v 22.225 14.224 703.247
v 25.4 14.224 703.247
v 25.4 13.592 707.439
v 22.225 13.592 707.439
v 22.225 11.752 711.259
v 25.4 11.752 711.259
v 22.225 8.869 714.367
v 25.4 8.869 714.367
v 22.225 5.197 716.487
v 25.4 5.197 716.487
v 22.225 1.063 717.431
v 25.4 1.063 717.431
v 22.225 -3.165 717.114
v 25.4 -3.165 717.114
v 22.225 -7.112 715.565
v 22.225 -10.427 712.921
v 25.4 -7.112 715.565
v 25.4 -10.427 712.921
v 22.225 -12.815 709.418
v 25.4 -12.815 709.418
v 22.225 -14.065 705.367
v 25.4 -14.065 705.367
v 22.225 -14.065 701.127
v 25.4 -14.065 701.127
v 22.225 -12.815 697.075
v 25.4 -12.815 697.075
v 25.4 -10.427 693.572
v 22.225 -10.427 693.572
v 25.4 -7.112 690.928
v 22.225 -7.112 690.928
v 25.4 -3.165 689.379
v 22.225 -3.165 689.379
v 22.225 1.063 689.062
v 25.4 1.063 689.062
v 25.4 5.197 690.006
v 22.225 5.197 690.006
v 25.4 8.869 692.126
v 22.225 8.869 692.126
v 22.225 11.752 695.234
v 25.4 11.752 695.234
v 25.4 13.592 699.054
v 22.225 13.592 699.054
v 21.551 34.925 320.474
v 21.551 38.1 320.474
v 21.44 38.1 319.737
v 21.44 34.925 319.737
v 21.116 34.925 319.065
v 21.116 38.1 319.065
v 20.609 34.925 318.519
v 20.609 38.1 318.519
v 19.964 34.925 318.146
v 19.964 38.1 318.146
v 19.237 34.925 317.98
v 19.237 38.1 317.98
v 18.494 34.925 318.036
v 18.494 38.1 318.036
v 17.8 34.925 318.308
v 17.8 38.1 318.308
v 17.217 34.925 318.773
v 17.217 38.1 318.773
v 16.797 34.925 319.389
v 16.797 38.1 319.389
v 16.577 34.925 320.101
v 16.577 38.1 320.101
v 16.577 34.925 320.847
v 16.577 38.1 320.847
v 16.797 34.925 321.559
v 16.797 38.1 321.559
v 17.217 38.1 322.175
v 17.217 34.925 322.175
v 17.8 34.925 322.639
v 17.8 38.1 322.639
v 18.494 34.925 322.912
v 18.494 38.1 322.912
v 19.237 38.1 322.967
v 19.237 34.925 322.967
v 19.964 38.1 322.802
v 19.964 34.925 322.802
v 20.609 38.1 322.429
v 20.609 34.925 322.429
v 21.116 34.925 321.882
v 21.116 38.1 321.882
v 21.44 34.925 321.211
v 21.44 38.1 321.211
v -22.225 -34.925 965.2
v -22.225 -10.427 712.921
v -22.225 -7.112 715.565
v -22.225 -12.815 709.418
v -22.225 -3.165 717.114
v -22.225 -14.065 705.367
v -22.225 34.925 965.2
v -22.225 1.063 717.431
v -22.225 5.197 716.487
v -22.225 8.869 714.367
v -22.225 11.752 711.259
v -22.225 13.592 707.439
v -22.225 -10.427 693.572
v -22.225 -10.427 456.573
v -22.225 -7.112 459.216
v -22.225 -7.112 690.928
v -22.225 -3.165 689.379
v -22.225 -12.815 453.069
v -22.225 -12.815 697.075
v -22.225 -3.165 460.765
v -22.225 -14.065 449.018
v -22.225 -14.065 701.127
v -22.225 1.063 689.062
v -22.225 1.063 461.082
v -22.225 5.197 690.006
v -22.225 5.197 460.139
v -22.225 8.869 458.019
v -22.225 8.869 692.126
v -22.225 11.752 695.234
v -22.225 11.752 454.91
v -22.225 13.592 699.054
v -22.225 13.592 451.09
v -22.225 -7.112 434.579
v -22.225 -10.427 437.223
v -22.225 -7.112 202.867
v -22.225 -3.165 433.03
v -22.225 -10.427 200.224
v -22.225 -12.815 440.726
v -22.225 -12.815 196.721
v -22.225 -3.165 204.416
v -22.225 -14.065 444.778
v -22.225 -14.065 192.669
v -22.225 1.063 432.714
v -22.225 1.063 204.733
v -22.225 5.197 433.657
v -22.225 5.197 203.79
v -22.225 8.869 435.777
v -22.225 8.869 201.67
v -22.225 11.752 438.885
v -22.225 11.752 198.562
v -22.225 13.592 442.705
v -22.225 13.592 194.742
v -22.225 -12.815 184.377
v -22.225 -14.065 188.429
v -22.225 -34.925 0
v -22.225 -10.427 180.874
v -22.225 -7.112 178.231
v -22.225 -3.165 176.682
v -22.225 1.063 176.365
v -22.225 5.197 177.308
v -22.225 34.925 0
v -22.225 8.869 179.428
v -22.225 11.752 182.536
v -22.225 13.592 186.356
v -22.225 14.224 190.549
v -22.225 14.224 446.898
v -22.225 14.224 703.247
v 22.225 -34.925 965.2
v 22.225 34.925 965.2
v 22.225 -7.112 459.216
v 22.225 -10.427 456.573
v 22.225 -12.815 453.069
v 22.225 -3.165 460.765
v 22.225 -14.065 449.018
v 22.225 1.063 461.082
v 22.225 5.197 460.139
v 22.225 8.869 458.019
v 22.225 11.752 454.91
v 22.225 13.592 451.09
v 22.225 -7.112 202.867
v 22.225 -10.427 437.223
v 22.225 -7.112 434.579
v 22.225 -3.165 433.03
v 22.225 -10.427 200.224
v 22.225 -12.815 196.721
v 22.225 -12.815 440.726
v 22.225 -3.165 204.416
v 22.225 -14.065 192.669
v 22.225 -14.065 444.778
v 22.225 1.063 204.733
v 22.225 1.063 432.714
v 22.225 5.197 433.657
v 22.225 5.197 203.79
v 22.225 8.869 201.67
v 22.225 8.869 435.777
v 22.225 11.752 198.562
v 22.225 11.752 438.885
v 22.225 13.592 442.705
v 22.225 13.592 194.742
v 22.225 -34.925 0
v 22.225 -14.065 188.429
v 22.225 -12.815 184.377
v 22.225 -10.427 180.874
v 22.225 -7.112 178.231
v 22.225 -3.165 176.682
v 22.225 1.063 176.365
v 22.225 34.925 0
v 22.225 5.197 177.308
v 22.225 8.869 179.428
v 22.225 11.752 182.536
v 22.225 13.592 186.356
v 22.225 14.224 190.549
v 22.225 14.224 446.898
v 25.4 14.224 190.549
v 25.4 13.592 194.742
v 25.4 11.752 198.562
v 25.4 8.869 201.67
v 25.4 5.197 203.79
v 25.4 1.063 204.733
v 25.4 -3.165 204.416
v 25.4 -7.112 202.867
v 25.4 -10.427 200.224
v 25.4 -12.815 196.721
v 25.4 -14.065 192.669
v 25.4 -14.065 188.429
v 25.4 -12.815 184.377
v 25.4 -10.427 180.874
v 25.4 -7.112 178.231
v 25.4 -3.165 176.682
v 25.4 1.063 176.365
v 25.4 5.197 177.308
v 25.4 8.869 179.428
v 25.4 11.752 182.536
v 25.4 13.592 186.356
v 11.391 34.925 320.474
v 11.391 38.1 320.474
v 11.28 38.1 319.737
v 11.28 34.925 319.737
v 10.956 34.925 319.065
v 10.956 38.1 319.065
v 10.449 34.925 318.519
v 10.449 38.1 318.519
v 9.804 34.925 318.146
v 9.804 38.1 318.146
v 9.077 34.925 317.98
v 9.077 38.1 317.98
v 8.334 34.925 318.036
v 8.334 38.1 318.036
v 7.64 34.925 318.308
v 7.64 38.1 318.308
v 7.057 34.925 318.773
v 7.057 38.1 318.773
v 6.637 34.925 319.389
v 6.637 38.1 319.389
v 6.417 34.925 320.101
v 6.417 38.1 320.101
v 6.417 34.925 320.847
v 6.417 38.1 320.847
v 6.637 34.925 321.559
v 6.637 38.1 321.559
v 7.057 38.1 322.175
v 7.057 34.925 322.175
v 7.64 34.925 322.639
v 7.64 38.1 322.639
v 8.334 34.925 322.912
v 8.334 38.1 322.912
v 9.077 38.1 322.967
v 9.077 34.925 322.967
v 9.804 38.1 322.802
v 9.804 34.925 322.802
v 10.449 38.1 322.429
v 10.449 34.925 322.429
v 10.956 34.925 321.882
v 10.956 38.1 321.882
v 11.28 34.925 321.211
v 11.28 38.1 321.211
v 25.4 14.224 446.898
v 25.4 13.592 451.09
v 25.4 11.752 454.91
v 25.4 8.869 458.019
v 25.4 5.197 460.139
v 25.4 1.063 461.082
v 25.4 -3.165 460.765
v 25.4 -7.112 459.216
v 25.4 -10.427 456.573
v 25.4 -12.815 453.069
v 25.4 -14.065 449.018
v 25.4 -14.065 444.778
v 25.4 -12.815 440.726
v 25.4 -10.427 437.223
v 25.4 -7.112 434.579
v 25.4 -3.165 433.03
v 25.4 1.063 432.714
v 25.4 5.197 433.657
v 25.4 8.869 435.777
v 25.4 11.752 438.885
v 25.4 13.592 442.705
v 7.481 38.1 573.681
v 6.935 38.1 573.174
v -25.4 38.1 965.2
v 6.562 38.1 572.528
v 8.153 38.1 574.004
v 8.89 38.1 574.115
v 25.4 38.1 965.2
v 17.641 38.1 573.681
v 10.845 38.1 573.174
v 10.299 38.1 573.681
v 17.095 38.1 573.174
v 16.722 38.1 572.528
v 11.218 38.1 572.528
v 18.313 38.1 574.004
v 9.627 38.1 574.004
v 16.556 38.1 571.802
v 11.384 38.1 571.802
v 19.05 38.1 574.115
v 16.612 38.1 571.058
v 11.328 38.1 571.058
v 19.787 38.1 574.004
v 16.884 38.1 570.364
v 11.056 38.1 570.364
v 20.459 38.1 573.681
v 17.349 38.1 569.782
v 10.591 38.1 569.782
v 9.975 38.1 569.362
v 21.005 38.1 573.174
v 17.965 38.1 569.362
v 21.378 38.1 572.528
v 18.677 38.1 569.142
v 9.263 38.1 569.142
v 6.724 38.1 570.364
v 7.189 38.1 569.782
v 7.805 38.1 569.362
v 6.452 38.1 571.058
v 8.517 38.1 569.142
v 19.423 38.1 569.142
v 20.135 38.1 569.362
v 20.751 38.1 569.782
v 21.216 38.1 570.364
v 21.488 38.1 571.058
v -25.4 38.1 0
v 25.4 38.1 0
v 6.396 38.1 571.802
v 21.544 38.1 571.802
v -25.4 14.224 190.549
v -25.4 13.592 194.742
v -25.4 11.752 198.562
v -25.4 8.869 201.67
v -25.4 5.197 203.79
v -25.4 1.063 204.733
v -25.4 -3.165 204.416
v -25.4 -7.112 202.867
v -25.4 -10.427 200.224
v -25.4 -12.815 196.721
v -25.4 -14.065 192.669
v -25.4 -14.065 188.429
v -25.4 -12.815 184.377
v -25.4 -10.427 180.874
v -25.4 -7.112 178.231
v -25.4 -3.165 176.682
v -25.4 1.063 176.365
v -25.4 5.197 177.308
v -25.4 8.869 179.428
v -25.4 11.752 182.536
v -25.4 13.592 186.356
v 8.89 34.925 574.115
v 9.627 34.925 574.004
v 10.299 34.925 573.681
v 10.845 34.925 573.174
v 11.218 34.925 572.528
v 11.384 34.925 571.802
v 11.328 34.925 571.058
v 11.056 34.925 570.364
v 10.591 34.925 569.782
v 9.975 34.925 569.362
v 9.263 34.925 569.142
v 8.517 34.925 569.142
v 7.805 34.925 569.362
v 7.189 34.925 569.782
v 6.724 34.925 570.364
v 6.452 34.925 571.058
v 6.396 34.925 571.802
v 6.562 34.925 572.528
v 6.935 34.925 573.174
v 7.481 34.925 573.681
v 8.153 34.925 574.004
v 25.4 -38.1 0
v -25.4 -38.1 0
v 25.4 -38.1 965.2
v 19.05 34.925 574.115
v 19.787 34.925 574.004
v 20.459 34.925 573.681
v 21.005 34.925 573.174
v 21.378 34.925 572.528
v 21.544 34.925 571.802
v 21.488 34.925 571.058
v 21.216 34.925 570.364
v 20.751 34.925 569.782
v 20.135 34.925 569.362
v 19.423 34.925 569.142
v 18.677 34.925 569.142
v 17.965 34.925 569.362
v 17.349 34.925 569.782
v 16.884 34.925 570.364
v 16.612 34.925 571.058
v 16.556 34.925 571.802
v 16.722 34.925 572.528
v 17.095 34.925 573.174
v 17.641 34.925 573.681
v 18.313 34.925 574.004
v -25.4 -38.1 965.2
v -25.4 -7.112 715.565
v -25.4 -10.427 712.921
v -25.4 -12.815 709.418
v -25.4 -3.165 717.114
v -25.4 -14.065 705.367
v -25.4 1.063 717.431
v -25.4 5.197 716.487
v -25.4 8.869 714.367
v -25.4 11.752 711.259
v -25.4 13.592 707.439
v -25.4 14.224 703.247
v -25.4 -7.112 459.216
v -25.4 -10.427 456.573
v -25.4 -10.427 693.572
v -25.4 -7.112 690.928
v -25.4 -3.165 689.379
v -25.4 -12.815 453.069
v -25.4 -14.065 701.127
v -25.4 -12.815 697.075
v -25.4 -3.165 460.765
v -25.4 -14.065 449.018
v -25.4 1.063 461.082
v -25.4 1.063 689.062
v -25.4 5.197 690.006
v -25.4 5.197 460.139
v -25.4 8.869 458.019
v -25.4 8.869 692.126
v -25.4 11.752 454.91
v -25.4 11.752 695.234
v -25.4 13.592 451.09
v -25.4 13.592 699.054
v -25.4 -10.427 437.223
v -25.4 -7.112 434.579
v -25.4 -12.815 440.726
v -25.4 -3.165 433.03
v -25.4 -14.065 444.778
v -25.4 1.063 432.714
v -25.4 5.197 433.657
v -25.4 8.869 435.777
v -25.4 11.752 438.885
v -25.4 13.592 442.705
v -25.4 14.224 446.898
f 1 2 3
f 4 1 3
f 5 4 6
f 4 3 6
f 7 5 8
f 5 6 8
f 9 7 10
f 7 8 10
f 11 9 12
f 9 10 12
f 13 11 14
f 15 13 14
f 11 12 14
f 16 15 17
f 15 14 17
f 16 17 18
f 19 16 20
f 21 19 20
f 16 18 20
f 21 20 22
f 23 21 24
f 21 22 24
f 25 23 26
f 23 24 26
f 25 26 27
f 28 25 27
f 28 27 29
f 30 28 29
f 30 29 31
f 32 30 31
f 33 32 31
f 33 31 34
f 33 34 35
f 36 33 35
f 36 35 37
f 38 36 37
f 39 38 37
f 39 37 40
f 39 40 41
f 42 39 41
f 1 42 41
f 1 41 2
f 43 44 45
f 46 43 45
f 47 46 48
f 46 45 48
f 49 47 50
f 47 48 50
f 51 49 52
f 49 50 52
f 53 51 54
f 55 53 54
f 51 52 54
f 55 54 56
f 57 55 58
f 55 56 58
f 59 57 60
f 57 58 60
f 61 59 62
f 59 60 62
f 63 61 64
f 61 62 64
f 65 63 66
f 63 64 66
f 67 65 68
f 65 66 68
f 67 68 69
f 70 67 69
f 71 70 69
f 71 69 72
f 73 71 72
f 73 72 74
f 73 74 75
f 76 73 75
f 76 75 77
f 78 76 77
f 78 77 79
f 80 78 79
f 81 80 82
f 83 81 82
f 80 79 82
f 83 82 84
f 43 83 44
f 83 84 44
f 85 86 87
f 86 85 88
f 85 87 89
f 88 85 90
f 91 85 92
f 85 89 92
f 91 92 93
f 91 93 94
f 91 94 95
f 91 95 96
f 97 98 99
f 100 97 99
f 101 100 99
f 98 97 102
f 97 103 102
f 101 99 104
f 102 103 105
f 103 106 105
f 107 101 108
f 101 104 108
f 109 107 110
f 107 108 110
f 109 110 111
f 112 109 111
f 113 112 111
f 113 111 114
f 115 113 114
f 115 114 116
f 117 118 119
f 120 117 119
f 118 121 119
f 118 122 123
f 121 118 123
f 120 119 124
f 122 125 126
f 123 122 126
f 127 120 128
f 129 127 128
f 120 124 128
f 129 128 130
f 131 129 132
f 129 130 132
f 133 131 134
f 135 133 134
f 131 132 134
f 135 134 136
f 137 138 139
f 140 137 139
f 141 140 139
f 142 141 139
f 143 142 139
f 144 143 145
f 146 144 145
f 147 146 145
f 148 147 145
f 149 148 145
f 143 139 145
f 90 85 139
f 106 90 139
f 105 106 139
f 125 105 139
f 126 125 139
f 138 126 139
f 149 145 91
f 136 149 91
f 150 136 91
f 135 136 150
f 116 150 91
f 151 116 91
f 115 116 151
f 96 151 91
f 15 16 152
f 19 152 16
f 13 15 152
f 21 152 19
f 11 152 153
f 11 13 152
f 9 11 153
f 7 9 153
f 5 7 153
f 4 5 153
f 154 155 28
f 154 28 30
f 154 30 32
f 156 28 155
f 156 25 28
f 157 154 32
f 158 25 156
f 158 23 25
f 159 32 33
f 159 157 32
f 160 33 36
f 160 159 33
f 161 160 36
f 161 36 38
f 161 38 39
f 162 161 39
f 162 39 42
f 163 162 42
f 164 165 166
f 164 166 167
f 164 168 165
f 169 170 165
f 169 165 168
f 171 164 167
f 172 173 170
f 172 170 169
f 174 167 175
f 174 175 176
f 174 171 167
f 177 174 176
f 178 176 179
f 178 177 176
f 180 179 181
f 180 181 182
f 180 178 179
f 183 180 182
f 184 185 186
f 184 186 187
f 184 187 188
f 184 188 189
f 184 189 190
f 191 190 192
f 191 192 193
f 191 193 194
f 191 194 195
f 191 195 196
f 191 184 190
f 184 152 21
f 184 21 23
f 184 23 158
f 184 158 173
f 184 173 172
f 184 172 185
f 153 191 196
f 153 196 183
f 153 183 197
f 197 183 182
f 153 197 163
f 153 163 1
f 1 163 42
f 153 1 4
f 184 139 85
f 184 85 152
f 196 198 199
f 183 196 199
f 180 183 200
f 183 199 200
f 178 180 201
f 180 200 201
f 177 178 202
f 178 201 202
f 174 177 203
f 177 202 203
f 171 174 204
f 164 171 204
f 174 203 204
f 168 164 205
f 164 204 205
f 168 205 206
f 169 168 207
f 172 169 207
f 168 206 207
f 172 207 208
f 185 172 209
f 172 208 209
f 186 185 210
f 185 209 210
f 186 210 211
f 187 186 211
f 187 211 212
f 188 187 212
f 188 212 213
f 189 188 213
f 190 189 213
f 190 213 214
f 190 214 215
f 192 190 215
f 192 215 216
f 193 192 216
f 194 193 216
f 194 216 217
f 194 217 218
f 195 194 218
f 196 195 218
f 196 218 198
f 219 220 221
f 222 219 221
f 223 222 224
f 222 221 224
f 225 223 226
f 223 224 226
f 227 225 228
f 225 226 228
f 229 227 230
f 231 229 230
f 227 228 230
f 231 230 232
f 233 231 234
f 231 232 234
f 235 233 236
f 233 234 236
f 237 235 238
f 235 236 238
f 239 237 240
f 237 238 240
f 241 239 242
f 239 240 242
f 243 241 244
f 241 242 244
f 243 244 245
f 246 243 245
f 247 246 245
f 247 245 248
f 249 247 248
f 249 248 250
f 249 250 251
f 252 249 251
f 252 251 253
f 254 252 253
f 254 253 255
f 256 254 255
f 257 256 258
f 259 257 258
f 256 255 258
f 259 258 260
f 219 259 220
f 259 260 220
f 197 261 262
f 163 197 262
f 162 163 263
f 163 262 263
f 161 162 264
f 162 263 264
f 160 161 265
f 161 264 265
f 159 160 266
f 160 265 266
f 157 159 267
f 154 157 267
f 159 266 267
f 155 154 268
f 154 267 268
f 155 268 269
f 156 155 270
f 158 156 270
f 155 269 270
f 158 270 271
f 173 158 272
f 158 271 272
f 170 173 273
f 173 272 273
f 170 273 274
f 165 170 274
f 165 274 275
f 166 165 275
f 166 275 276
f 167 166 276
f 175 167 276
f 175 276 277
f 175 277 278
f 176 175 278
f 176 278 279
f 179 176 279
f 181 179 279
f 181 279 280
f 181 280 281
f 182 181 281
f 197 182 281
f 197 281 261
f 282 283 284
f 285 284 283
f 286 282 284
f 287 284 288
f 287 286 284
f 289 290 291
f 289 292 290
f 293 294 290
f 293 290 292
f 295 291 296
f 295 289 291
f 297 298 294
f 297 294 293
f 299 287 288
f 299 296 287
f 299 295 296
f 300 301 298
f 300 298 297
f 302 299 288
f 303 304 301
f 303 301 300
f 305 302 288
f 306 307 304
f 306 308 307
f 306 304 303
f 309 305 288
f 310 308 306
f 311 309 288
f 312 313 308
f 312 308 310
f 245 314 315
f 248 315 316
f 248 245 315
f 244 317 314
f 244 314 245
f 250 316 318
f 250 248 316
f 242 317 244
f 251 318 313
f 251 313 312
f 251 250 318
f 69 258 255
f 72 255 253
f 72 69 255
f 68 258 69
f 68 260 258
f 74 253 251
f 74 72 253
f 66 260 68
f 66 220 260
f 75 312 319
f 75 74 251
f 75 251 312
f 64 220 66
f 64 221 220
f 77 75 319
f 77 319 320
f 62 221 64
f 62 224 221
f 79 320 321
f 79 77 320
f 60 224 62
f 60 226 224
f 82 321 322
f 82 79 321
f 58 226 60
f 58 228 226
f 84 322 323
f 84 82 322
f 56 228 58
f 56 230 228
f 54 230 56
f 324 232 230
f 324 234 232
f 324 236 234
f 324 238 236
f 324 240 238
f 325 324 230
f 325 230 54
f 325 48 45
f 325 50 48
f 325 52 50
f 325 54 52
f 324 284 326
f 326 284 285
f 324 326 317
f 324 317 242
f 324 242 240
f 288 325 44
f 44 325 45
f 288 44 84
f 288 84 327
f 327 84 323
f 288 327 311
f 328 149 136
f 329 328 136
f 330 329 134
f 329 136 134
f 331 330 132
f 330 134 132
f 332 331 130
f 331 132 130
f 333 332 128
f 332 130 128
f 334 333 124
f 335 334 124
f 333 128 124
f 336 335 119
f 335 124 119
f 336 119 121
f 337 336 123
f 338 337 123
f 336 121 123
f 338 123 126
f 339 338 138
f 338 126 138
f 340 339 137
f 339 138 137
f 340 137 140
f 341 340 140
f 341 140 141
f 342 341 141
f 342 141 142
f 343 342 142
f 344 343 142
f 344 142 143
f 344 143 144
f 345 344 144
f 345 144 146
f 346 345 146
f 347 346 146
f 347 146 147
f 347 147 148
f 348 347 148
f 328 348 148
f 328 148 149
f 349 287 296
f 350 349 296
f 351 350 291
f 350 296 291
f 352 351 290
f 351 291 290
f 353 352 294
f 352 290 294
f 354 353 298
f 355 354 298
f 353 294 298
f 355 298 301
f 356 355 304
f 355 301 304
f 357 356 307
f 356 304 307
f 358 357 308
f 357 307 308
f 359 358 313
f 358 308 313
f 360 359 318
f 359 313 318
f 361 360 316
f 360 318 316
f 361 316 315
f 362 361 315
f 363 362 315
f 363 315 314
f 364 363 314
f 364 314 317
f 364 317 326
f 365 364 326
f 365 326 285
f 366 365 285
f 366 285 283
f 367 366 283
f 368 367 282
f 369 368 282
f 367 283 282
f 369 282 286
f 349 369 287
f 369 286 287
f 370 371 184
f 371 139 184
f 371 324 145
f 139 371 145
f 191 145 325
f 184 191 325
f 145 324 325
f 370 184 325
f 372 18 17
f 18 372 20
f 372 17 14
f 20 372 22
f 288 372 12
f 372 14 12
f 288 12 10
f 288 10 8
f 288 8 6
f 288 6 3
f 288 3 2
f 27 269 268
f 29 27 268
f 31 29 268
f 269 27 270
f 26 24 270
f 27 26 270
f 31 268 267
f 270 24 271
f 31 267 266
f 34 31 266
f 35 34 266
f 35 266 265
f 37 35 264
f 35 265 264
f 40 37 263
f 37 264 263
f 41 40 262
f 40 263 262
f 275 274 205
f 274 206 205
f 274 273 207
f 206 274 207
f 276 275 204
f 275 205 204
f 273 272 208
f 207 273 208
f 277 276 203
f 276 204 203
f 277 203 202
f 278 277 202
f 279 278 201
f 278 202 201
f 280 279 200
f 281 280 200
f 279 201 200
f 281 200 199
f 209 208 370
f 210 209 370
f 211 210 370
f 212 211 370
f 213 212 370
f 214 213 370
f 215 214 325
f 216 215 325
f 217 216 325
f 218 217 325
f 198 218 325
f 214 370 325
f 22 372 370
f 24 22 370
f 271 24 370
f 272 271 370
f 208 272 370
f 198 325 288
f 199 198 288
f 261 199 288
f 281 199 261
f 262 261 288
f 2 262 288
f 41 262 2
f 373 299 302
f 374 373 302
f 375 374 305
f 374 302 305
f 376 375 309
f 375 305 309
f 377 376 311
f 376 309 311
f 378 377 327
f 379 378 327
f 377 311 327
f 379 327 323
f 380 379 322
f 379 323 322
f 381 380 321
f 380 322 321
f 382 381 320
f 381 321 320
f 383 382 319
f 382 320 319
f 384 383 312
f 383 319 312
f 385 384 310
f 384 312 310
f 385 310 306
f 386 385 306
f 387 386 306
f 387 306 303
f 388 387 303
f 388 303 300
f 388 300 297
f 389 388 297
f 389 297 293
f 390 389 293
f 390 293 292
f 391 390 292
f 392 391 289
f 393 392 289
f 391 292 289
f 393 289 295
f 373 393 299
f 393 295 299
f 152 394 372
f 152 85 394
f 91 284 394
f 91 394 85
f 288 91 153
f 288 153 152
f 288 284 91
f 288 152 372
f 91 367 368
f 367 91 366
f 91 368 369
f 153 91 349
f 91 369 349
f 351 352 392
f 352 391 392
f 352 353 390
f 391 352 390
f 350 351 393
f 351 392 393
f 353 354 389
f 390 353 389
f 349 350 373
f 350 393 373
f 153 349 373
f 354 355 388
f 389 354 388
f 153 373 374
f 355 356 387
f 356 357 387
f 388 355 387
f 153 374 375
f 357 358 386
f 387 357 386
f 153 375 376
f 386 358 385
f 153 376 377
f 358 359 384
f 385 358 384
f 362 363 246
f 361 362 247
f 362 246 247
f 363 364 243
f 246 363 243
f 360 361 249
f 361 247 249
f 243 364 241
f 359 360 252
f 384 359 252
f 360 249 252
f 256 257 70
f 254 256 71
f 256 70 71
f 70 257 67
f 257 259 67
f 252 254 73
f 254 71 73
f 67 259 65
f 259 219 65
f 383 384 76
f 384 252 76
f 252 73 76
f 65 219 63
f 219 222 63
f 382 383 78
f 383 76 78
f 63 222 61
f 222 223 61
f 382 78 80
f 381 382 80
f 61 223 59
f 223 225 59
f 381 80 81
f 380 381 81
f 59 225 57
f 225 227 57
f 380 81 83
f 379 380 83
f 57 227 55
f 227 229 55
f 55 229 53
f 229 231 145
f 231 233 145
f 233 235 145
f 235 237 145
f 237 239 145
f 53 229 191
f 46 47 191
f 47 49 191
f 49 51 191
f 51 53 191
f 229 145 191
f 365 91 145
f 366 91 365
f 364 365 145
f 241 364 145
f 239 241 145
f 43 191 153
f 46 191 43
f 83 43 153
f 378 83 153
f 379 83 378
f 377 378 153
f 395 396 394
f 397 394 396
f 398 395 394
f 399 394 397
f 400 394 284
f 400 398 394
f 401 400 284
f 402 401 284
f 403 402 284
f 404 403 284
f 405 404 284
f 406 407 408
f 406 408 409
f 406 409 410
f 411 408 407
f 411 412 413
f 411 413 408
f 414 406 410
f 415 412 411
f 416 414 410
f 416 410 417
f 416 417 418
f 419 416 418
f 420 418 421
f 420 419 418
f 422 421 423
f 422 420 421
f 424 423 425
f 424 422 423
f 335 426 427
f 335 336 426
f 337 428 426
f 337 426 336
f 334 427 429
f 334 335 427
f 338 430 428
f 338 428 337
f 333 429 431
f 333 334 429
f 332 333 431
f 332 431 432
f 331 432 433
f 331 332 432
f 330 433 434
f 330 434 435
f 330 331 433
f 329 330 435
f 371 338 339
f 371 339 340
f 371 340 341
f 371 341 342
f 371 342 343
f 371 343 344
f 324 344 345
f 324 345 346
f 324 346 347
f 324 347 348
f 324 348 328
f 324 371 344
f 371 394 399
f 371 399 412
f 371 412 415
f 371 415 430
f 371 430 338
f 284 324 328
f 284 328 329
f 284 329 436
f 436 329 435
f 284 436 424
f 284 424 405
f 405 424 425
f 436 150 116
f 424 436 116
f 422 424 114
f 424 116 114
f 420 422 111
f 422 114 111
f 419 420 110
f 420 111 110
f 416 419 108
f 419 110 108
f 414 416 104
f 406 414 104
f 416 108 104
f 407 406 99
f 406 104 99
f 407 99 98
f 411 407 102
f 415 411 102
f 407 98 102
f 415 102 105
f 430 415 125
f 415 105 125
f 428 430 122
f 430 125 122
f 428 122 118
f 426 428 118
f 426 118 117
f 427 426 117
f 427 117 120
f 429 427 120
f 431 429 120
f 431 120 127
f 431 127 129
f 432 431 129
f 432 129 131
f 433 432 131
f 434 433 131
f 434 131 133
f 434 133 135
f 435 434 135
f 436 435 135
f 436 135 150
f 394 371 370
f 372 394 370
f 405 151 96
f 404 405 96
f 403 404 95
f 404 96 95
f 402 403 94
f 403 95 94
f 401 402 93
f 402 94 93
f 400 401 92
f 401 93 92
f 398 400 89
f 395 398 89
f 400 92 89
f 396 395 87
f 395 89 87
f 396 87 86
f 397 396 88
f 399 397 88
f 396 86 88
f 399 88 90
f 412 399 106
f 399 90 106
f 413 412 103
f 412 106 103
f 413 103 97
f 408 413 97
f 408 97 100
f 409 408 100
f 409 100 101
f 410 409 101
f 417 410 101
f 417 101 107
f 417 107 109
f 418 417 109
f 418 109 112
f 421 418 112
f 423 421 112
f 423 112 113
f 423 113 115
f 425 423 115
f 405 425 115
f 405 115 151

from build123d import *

# Parameters (mm, degrees)
SKETCH1_W           = 50.8
SKETCH1_H           = 76.2
SKETCH1_W_2         = 44.45
SKETCH1_H_2         = 69.85
BOSS_EXTRUDE1_DEPTH = 965.2
CUT_EXTRUDE1_REACH  = 969.287
SKETCH4_R           = 14.224
SKETCH5_R           = 2.50063
CUT_EXTRUDE2_DEPTH  = 3.175


with BuildPart() as part:
    # Sketch1 → Boss-Extrude1 (new body)
    with BuildSketch(Plane.XY):
        Rectangle(SKETCH1_W, SKETCH1_H)
        Rectangle(SKETCH1_W_2, SKETCH1_H_2, mode=Mode.SUBTRACT)
    extrude(amount=BOSS_EXTRUDE1_DEPTH)

    # Cut-Extrude1: up to this face of the body (flat: up to its plane)
    cut_extrude1_end = Plane(part.part.faces().sort_by_distance((-25.4, 0, 482.6))[0])
    # Sketch4 → Cut-Extrude1 (cut, up to the picked face)
    with BuildSketch(Plane(origin=(25.4, 0, 0), x_dir=(0, 0, -1), z_dir=(1, 0, 0)), mode=Mode.PRIVATE) as cut_extrude1_sk1:
        with Locations(Location((-703.246600733, 0, 0), (0, 0, 90))):
            Circle(SKETCH4_R)
    cut_extrude1_tool1 = split(extrude(cut_extrude1_sk1.sketch, amount=-CUT_EXTRUDE1_REACH, mode=Mode.PRIVATE), bisect_by=cut_extrude1_end, keep=Keep.BOTH, mode=Mode.PRIVATE)
    # Sketch4 → Cut-Extrude1 (cut, up to the picked face)
    with BuildSketch(Plane(origin=(25.4, 0, 0), x_dir=(0, 0, -1), z_dir=(1, 0, 0)), mode=Mode.PRIVATE) as cut_extrude1_sk2:
        with Locations(Location((-190.549048411, 0, 0), (0, 0, 90))):
            Circle(SKETCH4_R)
    cut_extrude1_tool2 = split(extrude(cut_extrude1_sk2.sketch, amount=-CUT_EXTRUDE1_REACH, mode=Mode.PRIVATE), bisect_by=cut_extrude1_end, keep=Keep.BOTH, mode=Mode.PRIVATE)
    # Sketch4 → Cut-Extrude1 (cut, up to the picked face)
    with BuildSketch(Plane(origin=(25.4, 0, 0), x_dir=(0, 0, -1), z_dir=(1, 0, 0)), mode=Mode.PRIVATE) as cut_extrude1_sk3:
        with Locations(Location((-446.897824572, 0, 0), (0, 0, 90))):
            Circle(SKETCH4_R)
    cut_extrude1_tool3 = split(extrude(cut_extrude1_sk3.sketch, amount=-CUT_EXTRUDE1_REACH, mode=Mode.PRIVATE), bisect_by=cut_extrude1_end, keep=Keep.BOTH, mode=Mode.PRIVATE)
    add(cut_extrude1_tool1.solids().sort_by(Axis((25.4, 0, 703.246601), (-1, 0, 0)))[0], mode=Mode.SUBTRACT)
    add(cut_extrude1_tool2.solids().sort_by(Axis((25.4, 0, 190.549048), (-1, 0, 0)))[0], mode=Mode.SUBTRACT)
    add(cut_extrude1_tool3.solids().sort_by(Axis((25.4, 0, 446.897825), (-1, 0, 0)))[0], mode=Mode.SUBTRACT)

    # Sketch5 → Cut-Extrude2 (cut)
    with BuildSketch(Plane(origin=(0, 38.1, 0), x_dir=(1, 0, 0), z_dir=(0, 1, 0))):
        with Locations(Location((8.89, -571.614708402, 0), (0, 0, 270))):
            Circle(SKETCH5_R)
        with Locations(Location((19.05, -571.614708402, 0), (0, 0, 270))):
            Circle(SKETCH5_R)
        with Locations((19.05, -320.473808194)):
            Circle(SKETCH5_R)
        with Locations((8.89, -320.473808194)):
            Circle(SKETCH5_R)
    extrude(amount=-CUT_EXTRUDE2_DEPTH, mode=Mode.SUBTRACT)


solid = part.part
